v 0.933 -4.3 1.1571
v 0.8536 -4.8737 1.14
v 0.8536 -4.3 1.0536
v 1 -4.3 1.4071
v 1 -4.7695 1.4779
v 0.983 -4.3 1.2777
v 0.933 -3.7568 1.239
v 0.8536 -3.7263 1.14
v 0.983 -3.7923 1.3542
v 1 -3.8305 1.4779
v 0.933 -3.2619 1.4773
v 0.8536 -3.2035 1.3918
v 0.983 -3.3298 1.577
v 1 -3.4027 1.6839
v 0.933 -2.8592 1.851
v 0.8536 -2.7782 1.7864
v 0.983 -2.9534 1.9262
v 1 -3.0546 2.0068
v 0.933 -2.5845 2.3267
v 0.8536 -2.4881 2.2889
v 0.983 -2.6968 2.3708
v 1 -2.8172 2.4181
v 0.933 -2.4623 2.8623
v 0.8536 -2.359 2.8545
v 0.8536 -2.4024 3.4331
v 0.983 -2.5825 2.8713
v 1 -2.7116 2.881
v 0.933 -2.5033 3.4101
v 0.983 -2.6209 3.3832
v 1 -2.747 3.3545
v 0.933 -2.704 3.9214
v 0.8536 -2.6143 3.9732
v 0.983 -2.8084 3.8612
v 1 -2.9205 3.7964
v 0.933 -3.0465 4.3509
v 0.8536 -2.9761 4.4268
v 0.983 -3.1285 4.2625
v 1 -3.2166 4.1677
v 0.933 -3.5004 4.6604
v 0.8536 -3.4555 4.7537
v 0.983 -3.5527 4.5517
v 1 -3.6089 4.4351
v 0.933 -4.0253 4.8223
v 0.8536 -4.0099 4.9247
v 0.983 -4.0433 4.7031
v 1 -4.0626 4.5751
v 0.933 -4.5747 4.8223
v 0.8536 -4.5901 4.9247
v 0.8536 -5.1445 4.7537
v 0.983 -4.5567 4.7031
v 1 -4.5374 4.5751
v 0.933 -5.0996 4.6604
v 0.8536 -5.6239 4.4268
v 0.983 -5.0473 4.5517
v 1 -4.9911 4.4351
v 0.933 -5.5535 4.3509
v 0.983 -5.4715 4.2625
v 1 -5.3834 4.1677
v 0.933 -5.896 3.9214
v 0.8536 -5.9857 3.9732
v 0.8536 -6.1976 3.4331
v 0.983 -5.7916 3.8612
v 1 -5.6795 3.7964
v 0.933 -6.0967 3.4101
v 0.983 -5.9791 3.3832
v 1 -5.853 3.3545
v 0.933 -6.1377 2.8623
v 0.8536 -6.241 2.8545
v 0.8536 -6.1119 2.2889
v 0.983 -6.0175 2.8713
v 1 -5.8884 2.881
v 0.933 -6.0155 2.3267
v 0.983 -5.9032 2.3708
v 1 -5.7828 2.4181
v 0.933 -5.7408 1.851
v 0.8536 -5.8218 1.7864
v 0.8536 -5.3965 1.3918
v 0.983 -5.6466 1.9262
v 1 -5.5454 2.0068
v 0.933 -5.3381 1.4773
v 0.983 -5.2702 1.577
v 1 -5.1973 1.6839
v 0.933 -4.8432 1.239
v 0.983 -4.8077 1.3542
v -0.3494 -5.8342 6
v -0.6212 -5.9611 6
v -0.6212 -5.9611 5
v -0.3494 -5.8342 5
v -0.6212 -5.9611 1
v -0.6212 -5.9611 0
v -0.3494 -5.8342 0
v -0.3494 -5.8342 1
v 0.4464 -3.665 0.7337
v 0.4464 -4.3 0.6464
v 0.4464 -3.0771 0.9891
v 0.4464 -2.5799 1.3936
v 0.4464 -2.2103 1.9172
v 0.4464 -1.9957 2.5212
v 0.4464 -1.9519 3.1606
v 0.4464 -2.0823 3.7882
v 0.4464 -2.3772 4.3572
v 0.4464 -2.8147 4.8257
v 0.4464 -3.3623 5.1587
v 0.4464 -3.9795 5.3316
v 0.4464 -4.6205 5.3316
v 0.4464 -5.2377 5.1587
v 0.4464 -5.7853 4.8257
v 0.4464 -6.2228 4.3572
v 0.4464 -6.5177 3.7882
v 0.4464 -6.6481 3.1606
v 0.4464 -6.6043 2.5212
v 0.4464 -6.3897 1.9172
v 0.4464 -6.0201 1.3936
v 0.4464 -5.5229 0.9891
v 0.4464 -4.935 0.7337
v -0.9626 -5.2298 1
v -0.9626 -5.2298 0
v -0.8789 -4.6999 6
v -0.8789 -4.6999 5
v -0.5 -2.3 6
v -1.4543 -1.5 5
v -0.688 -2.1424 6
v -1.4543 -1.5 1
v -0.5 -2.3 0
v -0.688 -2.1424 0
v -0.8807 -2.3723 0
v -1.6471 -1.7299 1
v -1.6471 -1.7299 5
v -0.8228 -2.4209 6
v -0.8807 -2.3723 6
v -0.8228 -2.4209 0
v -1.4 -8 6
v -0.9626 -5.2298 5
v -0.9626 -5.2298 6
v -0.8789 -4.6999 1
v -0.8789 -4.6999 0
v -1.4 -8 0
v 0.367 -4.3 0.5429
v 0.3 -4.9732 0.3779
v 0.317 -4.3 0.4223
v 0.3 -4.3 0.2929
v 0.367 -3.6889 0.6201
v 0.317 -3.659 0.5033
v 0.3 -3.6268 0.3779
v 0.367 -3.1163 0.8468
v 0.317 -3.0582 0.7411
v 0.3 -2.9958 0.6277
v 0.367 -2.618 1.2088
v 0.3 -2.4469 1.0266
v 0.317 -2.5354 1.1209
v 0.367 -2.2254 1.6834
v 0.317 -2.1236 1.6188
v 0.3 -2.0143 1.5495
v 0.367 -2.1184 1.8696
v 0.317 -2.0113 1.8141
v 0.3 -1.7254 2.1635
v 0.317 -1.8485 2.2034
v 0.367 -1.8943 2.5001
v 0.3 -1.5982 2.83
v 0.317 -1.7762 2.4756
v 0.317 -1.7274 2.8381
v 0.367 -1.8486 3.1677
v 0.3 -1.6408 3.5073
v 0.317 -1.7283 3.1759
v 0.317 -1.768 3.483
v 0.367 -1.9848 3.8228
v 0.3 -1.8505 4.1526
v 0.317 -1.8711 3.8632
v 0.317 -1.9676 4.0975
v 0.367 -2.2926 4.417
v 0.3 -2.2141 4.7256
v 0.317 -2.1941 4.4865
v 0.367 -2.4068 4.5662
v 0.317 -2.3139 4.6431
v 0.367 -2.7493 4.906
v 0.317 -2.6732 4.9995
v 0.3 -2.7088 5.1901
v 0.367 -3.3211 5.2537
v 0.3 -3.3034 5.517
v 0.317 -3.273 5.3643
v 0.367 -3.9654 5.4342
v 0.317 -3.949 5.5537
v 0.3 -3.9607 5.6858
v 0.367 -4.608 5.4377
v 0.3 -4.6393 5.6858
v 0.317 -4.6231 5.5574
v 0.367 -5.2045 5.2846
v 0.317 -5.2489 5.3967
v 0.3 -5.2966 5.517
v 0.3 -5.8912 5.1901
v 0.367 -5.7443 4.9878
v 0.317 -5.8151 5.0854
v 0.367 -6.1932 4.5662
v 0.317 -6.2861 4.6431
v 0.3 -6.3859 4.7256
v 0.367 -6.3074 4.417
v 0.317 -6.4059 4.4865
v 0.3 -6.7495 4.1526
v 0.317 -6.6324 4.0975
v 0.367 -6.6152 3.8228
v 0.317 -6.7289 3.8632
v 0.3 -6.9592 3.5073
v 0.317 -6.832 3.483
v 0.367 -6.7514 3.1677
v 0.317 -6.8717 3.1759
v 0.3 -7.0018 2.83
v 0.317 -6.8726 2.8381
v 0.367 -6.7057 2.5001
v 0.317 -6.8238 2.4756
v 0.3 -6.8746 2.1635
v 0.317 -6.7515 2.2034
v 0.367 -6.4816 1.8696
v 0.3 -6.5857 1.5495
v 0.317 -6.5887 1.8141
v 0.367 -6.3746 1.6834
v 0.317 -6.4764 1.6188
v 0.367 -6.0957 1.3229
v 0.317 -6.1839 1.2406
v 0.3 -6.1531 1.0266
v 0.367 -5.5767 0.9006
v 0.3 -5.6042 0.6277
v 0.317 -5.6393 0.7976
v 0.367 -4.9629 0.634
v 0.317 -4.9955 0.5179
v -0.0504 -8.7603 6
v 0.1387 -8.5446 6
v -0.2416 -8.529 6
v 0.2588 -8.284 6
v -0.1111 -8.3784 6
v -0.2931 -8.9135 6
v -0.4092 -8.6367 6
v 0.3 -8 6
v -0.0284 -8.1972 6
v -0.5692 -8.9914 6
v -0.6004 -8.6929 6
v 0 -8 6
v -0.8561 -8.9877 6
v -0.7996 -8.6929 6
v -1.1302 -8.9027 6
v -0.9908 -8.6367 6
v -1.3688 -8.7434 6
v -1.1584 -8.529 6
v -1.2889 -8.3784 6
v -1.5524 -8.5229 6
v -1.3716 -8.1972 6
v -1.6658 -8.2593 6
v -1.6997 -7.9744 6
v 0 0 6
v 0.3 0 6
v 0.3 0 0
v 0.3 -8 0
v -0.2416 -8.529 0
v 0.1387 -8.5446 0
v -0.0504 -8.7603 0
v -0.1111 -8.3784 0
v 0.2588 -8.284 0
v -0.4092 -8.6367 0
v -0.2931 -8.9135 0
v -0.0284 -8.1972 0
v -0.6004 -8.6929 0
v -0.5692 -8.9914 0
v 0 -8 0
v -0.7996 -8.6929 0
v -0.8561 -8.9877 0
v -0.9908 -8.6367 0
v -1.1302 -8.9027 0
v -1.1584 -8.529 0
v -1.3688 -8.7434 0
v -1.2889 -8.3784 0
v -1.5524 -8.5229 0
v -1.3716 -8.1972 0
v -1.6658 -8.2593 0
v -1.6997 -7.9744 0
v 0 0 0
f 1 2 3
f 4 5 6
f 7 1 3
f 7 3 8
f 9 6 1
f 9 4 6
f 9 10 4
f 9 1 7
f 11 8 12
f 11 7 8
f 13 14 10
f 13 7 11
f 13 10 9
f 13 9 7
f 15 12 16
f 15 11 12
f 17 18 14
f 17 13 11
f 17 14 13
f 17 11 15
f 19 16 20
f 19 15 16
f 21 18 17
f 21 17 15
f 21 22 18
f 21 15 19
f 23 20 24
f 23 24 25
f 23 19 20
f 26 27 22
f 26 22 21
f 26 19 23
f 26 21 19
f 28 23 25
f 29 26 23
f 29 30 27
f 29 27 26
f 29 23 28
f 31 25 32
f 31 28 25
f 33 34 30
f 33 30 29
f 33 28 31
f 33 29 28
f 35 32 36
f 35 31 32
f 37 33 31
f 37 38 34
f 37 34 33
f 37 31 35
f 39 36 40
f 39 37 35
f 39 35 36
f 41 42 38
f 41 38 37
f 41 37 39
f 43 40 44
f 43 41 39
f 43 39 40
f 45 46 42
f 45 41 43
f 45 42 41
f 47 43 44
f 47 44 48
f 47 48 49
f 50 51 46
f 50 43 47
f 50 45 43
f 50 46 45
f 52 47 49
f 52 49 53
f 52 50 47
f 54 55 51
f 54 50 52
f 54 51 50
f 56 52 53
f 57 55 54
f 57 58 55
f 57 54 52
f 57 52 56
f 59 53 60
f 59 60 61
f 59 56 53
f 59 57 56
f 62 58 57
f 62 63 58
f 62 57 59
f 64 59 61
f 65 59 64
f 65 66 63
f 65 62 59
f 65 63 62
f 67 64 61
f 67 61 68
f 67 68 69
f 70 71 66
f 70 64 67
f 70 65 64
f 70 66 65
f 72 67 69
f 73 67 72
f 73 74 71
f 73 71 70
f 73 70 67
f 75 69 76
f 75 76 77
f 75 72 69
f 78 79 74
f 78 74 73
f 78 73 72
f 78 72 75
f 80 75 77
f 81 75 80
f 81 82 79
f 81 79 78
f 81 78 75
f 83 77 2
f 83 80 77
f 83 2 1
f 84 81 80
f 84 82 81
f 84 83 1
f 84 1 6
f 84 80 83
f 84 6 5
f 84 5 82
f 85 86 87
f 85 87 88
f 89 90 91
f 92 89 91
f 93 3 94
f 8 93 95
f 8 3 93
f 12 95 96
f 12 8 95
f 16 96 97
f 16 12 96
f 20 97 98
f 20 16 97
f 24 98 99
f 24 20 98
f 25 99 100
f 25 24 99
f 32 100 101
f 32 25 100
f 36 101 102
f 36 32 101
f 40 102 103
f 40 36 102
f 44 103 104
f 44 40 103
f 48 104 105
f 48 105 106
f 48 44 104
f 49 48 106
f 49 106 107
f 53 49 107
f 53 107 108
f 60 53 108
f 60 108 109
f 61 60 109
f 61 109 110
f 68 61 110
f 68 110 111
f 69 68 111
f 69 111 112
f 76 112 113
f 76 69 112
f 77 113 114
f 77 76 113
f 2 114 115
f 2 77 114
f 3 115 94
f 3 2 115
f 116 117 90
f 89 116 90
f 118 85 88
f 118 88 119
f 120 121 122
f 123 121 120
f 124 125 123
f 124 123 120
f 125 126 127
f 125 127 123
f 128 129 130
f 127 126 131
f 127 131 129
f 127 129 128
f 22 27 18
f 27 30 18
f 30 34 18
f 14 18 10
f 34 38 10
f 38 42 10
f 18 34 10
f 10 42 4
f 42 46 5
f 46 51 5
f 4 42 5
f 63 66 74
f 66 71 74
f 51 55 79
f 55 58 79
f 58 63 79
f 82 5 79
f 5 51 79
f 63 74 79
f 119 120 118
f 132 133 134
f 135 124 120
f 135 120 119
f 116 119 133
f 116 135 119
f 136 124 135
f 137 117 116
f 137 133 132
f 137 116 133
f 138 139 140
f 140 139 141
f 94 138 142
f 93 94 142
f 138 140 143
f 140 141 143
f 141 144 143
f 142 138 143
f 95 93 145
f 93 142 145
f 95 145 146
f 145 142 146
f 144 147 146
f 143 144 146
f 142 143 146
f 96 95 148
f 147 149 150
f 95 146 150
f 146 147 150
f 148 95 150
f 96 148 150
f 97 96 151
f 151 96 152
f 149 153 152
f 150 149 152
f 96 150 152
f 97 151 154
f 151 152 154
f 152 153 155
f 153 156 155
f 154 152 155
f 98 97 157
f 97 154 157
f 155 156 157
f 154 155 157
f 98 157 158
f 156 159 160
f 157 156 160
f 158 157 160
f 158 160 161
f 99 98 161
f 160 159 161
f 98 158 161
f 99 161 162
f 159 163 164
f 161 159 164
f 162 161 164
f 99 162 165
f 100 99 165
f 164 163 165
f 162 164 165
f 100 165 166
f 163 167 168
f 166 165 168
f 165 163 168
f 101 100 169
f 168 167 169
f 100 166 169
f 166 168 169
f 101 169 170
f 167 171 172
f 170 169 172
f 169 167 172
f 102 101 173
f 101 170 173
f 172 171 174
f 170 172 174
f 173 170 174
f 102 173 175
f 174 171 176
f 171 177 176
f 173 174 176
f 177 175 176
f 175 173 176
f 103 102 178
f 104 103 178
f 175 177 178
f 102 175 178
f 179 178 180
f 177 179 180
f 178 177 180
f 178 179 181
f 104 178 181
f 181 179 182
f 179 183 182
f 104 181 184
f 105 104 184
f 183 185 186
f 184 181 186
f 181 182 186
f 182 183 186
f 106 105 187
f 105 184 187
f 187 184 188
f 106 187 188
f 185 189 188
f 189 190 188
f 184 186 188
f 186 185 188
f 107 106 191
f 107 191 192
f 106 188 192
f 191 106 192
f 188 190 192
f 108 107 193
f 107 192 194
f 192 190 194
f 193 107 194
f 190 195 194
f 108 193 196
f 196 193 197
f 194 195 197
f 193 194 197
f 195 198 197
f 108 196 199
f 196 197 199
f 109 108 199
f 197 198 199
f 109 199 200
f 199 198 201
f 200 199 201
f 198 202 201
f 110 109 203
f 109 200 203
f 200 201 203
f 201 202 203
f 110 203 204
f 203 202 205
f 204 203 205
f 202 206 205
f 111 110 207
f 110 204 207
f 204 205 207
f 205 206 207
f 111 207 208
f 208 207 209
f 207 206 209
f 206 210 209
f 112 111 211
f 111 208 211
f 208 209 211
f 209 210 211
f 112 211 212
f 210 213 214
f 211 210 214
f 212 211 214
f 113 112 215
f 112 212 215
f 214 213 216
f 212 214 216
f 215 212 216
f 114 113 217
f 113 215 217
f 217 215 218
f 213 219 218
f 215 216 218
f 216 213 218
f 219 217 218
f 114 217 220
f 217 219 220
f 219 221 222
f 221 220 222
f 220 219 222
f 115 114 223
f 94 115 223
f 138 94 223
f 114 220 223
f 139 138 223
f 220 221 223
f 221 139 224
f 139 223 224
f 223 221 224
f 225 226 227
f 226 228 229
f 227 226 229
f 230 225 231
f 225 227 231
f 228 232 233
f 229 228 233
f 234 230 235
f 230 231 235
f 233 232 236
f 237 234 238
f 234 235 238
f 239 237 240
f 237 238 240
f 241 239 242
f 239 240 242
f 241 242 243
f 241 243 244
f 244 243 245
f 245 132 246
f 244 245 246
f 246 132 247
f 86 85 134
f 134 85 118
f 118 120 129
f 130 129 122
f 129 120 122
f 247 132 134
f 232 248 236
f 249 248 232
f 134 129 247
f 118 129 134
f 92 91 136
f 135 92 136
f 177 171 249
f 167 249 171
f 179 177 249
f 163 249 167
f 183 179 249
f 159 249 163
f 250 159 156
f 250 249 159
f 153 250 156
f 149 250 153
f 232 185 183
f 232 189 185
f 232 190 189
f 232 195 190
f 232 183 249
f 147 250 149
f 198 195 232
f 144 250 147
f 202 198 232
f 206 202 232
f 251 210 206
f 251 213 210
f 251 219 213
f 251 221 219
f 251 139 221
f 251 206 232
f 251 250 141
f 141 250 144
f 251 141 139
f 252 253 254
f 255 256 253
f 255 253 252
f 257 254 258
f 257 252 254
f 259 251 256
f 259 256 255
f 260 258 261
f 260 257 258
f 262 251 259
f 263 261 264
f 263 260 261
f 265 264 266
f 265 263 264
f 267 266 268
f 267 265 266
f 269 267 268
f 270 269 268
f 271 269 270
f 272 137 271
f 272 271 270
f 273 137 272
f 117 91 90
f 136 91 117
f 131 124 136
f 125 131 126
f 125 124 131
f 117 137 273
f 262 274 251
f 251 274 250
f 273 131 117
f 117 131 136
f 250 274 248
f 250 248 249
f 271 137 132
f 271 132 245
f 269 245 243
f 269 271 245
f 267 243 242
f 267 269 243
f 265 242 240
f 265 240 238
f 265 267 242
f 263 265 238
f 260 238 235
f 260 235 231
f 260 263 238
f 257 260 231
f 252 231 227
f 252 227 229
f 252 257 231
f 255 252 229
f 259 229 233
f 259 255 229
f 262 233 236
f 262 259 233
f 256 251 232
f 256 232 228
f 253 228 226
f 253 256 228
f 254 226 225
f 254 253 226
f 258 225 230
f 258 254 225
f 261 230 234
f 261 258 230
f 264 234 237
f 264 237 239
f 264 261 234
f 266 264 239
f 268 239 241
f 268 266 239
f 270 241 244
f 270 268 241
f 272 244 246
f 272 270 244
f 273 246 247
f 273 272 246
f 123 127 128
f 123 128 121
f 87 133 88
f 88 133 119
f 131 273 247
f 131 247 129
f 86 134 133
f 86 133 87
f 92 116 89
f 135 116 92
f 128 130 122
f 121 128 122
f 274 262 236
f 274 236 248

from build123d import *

# Parameters (mm, degrees)
BOSS_EXTRUDE1_DEPTH = 6
CHAMFER1_SIZE       = 1
SKETCH2_R           = 1.5
BOSS_EXTRUDE2_DEPTH = 0.7
CHAMFER2_SIZE       = 1
FILLET1_R           = 0.5
BOSS_EXTRUDE3_DEPTH = 1
BOSS_EXTRUDE4_START = 6
BOSS_EXTRUDE4_DEPTH = 1


with BuildPart() as part:
    # Sketch1 → Boss-Extrude1 (new body)
    with BuildSketch(Plane.XY):
        with BuildLine():
            ThreePointArc((0.3, -8), (-0.712809438, -8.999917956), (-1.699671837, -7.974383226))
            Line((-1.699671837, -7.974383226), (-0.822800703, -2.420866047))
            Line((-0.822800703, -2.420866047), (-1.647054908, -1.729905435))
            Line((-1.647054908, -1.729905435), (-1.454328442, -1.5))
            Line((-1.454328442, -1.5), (-0.5, -2.3))
            Line((-0.5, -2.3), (-1.4, -8))
            ThreePointArc((-1.4, -8), (-0.7, -8.7), (0, -8))
            Line((0, -8), (0, 0))
            Line((0, 0), (0.3, 0))
            Line((0.3, 0), (0.3, -8))
        make_face()
    extrude(amount=BOSS_EXTRUDE1_DEPTH)

    # Chamfer1
    chamfer1_edges = [part.edges().sort_by_distance(p)[0] for p in [
        (-1.550691675, -1.614952718, 0),
        (-1.550691675, -1.614952718, 6),
    ]]
    chamfer(chamfer1_edges, length=CHAMFER1_SIZE)

    # Sketch2 → Boss-Extrude2 (add)
    with BuildSketch(Plane(origin=(0.3, 0, 0), x_dir=(0, 0, -1), z_dir=(1, 0, 0))):
        with Locations((-3, -4.3)):
            Circle(SKETCH2_R)
    extrude(amount=BOSS_EXTRUDE2_DEPTH)

    # Chamfer2
    # the kernel refuses this chamfer: 1 mm, written as the material it adds along each edge
    with BuildSketch(Plane(origin=(0.3, -4.3, 3), x_dir=(0, 0, -1), z_dir=(0, -1, 0))) as chamfer2_piece_1_section:
        Polygon((1.5 + CHAMFER2_SIZE, 0), (1.5, CHAMFER2_SIZE), (1.5, 0), align=None)
    chamfer2_piece_1 = revolve(axis=Axis((0.3, -4.3, 3), (1, 0, 0)), mode=Mode.PRIVATE)
    chamfer2_piece_1 = split(chamfer2_piece_1, bisect_by=Plane(origin=(1, -4.3, 5.151462954), z_dir=(-1, 0, 0)), keep=Keep.TOP, mode=Mode.PRIVATE)
    add(chamfer2_piece_1)

    # Fillet1
    fillet1_edges = [part.edges().sort_by_distance(p)[0] for p in [
        (0.3, -4.3, 5.5),
        (1, -4.3, 4.8),
    ]]
    fillet(fillet1_edges, radius=FILLET1_R)

    # Sketch1<3> → Boss-Extrude3 (add)
    with BuildSketch(Plane.XY):
        Polygon((-0.878934414, -4.699917956), (-0.962606384, -5.229840435), (-0.621188888, -5.961100292), (-0.349357155, -5.83418493), align=None)
    extrude(amount=BOSS_EXTRUDE3_DEPTH)

    # Sketch1<4> → Boss-Extrude4 (add)
    with BuildSketch(Plane.XY.offset(BOSS_EXTRUDE4_START)):
        Polygon((-0.878934414, -4.699917956), (-0.962606384, -5.229840435), (-0.621188888, -5.961100292), (-0.349357155, -5.83418493), align=None)
    extrude(amount=-BOSS_EXTRUDE4_DEPTH)


solid = part.part
